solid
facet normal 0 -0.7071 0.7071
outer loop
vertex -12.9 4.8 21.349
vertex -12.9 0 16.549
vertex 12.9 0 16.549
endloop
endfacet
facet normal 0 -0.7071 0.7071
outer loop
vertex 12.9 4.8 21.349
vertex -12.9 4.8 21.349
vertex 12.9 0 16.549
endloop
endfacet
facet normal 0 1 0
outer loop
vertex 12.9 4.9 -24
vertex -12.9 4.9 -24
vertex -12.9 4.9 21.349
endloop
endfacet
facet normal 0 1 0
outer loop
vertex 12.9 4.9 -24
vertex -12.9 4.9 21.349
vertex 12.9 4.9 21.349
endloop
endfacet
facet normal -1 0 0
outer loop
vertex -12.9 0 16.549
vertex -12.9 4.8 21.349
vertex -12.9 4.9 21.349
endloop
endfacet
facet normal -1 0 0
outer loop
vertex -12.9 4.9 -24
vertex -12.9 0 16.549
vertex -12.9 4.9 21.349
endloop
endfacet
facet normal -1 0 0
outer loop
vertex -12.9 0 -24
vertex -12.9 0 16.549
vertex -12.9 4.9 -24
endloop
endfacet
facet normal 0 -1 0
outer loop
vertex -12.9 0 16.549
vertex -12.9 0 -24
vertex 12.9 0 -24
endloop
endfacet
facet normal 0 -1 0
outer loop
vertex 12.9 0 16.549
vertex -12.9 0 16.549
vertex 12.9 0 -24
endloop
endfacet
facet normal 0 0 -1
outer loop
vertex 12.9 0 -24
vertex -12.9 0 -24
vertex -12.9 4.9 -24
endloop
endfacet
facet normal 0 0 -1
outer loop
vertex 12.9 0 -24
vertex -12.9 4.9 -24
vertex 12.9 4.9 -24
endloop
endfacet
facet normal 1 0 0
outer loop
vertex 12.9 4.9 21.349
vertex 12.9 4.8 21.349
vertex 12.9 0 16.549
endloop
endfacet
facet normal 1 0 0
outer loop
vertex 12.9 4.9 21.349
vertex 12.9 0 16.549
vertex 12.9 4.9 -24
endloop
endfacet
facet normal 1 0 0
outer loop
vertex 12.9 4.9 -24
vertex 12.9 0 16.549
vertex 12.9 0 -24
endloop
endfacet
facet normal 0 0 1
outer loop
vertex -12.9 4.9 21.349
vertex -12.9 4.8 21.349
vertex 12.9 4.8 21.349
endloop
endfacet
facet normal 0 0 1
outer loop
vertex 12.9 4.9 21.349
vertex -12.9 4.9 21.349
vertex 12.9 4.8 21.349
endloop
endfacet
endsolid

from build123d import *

# Parameters (mm, degrees)
ESQUISSE1_W      = 25.8
ESQUISSE1_H      = 45.349242405
EXTRUSION1_DEPTH = 4.9
CHANFREIN2_SIZE  = 4.8


with BuildPart() as part:
    # Esquisse1 → Extrusion1 (new body)
    with BuildSketch(Plane(origin=(0, 0, 0), x_dir=(1, 0, 0), z_dir=(0, 1, 0))):
        with Locations((0, 1.325378797)):
            Rectangle(ESQUISSE1_W, ESQUISSE1_H)
    extrude(amount=EXTRUSION1_DEPTH)

    # Chanfrein2
    chanfrein2_edges = [part.edges().sort_by_distance(p)[0] for p in [
        (0, 0, 21.349242405),
    ]]
    chamfer(chanfrein2_edges, length=CHANFREIN2_SIZE)


solid = part.part
